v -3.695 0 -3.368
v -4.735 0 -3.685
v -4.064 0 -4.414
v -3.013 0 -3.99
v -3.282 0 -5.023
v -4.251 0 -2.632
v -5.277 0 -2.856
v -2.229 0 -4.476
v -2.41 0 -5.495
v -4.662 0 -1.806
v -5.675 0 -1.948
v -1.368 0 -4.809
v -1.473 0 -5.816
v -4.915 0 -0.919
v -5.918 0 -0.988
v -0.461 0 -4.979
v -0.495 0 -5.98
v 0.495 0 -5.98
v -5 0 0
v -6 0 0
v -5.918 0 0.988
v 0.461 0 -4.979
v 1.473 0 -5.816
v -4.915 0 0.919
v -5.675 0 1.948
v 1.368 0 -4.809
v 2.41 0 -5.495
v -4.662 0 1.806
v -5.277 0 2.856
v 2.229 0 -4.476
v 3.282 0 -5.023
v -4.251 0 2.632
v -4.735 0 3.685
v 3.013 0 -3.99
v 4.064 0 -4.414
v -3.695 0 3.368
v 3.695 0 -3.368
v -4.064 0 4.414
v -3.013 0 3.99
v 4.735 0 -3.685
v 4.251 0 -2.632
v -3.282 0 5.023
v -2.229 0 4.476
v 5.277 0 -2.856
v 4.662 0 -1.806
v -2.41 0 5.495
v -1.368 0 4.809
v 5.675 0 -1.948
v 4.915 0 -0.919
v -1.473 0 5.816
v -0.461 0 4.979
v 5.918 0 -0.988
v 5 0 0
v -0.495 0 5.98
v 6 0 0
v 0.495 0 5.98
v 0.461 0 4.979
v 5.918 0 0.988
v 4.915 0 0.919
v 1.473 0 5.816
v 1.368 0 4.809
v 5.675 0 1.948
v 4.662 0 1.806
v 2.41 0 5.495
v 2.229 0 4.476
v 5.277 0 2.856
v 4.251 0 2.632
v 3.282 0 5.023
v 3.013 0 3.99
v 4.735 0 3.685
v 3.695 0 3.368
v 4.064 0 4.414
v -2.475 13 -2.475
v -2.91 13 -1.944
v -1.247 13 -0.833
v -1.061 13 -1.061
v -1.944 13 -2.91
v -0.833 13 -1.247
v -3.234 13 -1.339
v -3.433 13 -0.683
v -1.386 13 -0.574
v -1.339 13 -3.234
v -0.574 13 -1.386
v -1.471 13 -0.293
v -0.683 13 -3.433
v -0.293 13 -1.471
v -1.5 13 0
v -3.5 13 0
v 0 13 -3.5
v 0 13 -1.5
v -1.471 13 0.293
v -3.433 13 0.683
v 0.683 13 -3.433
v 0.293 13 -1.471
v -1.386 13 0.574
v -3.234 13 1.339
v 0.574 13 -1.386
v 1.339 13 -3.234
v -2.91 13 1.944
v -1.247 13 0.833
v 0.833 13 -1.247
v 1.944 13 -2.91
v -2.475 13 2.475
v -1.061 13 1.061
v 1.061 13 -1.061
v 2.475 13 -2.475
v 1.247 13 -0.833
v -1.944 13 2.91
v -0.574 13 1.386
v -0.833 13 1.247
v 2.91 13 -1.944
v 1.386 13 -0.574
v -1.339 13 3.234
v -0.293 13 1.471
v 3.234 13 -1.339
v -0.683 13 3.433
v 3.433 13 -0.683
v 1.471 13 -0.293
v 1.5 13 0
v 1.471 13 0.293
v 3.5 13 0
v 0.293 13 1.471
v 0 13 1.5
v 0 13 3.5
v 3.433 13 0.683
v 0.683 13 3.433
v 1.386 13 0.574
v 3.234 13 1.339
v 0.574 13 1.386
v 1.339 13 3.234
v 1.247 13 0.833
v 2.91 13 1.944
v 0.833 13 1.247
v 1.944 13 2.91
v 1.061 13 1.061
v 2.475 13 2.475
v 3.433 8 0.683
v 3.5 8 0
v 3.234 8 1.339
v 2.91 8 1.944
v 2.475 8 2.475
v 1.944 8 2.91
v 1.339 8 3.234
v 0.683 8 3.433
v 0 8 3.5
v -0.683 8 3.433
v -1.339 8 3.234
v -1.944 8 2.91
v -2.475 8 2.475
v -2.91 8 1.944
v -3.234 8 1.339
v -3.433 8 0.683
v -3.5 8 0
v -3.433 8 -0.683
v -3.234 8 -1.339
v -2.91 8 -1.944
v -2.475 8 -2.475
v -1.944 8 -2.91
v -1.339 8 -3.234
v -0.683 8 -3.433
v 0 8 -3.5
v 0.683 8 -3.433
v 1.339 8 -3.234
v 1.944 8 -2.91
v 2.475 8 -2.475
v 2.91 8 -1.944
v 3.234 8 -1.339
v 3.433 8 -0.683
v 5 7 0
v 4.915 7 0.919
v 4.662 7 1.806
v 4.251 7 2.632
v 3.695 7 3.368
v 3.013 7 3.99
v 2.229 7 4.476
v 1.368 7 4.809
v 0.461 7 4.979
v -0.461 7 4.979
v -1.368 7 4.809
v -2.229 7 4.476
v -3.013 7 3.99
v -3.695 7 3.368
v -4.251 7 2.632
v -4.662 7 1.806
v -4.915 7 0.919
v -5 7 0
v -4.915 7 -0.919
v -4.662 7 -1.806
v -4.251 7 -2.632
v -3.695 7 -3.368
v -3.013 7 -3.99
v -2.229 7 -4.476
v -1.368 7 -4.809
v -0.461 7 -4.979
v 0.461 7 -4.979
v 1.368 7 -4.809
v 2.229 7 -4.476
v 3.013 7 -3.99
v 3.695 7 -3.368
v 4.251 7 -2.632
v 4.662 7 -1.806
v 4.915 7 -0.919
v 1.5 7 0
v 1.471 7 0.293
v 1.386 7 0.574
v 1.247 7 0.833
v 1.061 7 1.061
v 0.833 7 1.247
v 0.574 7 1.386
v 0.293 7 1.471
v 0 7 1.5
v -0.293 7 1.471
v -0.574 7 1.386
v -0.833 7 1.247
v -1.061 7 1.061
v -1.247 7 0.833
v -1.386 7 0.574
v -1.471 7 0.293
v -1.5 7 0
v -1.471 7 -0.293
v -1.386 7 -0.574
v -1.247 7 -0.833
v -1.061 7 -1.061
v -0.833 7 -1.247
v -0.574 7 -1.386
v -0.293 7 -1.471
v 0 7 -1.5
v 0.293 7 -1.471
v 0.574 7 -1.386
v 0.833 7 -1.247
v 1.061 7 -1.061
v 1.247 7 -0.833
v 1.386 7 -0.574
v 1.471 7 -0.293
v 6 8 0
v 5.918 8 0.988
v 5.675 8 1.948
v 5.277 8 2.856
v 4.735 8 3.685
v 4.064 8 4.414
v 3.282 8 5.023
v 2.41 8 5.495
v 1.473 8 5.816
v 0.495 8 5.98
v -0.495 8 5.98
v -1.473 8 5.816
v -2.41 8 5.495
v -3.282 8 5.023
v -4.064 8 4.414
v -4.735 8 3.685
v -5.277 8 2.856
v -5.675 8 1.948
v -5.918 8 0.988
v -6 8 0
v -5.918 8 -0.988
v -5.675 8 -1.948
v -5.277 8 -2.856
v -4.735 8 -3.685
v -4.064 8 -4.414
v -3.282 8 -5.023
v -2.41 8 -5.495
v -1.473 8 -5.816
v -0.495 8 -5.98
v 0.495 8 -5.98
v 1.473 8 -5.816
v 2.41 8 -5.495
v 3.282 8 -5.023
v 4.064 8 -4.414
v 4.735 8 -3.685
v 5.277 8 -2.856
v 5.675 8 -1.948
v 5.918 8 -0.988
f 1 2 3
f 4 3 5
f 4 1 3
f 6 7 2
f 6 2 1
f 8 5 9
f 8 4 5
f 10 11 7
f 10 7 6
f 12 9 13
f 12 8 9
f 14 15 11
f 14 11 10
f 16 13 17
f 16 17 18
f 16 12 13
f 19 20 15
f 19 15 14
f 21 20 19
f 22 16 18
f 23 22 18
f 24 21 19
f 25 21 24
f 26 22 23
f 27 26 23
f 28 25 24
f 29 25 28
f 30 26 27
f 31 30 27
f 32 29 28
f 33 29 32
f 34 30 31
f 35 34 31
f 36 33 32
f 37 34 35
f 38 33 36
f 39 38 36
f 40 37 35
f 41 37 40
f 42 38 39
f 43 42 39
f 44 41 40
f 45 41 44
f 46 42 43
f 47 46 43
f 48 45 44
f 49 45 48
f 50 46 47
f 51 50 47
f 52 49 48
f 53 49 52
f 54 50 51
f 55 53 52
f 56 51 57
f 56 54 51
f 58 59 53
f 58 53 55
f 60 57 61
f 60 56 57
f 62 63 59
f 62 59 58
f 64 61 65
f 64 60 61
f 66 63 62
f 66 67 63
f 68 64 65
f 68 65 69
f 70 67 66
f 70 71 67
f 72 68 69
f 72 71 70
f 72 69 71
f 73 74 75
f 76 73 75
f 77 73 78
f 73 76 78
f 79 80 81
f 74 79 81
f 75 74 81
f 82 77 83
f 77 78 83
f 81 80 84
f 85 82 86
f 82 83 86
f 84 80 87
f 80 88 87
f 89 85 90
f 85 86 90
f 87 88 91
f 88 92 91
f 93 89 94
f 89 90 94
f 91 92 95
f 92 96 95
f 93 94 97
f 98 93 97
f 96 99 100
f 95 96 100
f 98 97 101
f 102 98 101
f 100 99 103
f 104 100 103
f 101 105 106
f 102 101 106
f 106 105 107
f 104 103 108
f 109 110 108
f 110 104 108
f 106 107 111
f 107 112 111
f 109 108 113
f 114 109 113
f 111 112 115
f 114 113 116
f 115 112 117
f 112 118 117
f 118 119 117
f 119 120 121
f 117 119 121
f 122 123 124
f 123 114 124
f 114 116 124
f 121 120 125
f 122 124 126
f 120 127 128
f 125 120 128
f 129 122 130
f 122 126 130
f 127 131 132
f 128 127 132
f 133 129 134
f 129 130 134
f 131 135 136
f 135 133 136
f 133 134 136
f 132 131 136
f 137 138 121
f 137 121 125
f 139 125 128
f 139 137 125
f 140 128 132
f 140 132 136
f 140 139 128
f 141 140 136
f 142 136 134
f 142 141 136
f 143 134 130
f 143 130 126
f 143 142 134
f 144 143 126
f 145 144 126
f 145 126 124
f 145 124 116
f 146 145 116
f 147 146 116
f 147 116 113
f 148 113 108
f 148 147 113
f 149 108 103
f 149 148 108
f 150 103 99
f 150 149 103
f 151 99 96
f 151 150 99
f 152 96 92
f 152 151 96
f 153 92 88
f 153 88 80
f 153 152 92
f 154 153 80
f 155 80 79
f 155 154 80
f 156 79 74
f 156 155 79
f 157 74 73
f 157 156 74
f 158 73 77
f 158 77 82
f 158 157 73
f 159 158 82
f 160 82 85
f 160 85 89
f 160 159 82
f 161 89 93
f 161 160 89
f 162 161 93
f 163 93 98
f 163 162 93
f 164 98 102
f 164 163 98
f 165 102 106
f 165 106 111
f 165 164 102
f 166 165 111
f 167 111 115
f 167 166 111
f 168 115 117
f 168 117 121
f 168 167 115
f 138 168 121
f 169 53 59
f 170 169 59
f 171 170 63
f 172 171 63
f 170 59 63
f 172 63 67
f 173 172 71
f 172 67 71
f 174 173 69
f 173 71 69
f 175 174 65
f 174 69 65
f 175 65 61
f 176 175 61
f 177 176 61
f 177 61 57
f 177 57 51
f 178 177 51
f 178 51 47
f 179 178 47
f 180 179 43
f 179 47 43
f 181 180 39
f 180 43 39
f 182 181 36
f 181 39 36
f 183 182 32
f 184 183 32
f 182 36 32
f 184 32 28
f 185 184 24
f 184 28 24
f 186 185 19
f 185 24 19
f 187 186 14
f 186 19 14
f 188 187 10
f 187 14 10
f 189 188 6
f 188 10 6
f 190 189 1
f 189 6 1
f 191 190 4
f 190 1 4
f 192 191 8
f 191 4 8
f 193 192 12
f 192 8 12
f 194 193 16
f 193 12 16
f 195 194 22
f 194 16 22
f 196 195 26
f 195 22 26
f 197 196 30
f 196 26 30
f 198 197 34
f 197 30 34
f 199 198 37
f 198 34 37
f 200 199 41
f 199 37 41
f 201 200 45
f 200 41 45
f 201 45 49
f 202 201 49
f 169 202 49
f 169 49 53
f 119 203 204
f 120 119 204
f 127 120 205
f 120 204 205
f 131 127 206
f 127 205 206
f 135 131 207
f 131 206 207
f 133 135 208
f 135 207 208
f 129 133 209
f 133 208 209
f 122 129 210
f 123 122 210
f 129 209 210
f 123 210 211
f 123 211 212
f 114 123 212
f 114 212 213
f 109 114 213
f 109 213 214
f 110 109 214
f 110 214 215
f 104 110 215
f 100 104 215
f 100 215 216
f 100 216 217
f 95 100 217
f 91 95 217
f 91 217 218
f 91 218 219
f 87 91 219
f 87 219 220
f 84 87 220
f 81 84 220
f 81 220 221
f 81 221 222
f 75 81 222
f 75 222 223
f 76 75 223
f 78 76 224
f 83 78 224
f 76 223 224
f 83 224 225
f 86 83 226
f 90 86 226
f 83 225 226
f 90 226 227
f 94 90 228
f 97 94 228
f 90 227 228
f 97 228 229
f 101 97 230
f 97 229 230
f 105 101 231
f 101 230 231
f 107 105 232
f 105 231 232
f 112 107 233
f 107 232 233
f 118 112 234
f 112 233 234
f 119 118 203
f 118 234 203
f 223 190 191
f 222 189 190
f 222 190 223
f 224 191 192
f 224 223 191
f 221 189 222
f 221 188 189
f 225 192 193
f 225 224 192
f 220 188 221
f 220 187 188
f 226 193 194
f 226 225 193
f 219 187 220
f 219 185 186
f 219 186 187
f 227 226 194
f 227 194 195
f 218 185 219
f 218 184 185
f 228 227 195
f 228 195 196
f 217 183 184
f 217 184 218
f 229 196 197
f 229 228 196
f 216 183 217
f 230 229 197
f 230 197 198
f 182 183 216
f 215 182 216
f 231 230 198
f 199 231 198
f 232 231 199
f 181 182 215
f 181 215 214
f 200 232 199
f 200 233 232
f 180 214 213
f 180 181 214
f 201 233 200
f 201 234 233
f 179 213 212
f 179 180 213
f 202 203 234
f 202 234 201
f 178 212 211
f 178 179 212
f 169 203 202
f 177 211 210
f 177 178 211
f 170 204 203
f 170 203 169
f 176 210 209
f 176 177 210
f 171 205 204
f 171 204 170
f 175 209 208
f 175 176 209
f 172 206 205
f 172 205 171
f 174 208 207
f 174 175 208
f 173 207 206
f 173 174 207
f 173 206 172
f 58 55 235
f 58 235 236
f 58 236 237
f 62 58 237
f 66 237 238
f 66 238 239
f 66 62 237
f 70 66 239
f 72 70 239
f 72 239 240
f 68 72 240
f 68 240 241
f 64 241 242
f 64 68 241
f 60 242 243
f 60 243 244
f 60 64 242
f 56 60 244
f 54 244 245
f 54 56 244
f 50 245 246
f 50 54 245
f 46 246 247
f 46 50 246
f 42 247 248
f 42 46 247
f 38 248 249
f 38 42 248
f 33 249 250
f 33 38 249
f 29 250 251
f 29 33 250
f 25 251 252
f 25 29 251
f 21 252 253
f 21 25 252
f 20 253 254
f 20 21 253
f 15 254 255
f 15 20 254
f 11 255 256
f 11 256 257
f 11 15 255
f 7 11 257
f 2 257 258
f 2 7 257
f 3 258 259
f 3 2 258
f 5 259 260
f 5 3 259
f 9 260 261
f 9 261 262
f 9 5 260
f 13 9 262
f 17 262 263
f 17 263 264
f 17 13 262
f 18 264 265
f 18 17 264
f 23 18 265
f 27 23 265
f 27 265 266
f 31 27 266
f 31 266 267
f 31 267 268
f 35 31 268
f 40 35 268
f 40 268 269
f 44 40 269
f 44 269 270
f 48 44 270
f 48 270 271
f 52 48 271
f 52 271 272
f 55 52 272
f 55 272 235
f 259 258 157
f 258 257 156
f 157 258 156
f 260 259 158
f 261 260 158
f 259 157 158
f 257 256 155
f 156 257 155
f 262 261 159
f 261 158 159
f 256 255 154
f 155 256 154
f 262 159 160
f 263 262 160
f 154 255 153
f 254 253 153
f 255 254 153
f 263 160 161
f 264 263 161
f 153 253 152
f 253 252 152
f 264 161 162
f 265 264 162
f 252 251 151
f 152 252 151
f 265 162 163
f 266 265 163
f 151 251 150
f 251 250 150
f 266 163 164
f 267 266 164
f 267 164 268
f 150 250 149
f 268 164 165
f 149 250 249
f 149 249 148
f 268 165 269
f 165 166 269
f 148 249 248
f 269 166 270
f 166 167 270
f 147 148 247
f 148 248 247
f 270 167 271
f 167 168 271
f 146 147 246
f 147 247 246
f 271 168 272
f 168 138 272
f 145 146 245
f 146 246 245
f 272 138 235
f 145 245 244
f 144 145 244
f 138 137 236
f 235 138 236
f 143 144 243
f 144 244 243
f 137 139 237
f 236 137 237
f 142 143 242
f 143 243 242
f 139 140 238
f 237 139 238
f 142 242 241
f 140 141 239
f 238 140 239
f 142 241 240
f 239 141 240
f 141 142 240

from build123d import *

# Parameters (mm, degrees)
F0_R     = 6
F0_R_2   = 5
F1_DEPTH = 8
F3_R     = 3.5
F3_R_2   = 1.5
F4_DEPTH = 5
F5_R     = 5
F6_DEPTH = 7
F7_R     = 1.5
F8_DEPTH = 25


with BuildPart() as f1:
    # F0 (on Front) → F1 (new body)
    with BuildSketch(Plane.XZ):
        Circle(F0_R)
        Circle(F0_R_2, mode=Mode.SUBTRACT)
        Circle(F0_R_2)
    extrude(amount=-F1_DEPTH)

    # F3 (on offset) → F4 (join)
    with BuildSketch(Plane.XZ.offset(-8)):
        Circle(F3_R)
        Circle(F3_R_2, mode=Mode.SUBTRACT)
        Circle(F3_R_2)
    extrude(amount=-F4_DEPTH)

    # F5 (on Front) → F6 (cut)
    with BuildSketch(Plane.XZ):
        Circle(F5_R)
    extrude(amount=-F6_DEPTH, mode=Mode.SUBTRACT)

    # F7 (on Front) → F8 (cut)
    with BuildSketch(Plane.XZ):
        Circle(F7_R)
    extrude(amount=-F8_DEPTH, mode=Mode.SUBTRACT)


solid = f1.part
